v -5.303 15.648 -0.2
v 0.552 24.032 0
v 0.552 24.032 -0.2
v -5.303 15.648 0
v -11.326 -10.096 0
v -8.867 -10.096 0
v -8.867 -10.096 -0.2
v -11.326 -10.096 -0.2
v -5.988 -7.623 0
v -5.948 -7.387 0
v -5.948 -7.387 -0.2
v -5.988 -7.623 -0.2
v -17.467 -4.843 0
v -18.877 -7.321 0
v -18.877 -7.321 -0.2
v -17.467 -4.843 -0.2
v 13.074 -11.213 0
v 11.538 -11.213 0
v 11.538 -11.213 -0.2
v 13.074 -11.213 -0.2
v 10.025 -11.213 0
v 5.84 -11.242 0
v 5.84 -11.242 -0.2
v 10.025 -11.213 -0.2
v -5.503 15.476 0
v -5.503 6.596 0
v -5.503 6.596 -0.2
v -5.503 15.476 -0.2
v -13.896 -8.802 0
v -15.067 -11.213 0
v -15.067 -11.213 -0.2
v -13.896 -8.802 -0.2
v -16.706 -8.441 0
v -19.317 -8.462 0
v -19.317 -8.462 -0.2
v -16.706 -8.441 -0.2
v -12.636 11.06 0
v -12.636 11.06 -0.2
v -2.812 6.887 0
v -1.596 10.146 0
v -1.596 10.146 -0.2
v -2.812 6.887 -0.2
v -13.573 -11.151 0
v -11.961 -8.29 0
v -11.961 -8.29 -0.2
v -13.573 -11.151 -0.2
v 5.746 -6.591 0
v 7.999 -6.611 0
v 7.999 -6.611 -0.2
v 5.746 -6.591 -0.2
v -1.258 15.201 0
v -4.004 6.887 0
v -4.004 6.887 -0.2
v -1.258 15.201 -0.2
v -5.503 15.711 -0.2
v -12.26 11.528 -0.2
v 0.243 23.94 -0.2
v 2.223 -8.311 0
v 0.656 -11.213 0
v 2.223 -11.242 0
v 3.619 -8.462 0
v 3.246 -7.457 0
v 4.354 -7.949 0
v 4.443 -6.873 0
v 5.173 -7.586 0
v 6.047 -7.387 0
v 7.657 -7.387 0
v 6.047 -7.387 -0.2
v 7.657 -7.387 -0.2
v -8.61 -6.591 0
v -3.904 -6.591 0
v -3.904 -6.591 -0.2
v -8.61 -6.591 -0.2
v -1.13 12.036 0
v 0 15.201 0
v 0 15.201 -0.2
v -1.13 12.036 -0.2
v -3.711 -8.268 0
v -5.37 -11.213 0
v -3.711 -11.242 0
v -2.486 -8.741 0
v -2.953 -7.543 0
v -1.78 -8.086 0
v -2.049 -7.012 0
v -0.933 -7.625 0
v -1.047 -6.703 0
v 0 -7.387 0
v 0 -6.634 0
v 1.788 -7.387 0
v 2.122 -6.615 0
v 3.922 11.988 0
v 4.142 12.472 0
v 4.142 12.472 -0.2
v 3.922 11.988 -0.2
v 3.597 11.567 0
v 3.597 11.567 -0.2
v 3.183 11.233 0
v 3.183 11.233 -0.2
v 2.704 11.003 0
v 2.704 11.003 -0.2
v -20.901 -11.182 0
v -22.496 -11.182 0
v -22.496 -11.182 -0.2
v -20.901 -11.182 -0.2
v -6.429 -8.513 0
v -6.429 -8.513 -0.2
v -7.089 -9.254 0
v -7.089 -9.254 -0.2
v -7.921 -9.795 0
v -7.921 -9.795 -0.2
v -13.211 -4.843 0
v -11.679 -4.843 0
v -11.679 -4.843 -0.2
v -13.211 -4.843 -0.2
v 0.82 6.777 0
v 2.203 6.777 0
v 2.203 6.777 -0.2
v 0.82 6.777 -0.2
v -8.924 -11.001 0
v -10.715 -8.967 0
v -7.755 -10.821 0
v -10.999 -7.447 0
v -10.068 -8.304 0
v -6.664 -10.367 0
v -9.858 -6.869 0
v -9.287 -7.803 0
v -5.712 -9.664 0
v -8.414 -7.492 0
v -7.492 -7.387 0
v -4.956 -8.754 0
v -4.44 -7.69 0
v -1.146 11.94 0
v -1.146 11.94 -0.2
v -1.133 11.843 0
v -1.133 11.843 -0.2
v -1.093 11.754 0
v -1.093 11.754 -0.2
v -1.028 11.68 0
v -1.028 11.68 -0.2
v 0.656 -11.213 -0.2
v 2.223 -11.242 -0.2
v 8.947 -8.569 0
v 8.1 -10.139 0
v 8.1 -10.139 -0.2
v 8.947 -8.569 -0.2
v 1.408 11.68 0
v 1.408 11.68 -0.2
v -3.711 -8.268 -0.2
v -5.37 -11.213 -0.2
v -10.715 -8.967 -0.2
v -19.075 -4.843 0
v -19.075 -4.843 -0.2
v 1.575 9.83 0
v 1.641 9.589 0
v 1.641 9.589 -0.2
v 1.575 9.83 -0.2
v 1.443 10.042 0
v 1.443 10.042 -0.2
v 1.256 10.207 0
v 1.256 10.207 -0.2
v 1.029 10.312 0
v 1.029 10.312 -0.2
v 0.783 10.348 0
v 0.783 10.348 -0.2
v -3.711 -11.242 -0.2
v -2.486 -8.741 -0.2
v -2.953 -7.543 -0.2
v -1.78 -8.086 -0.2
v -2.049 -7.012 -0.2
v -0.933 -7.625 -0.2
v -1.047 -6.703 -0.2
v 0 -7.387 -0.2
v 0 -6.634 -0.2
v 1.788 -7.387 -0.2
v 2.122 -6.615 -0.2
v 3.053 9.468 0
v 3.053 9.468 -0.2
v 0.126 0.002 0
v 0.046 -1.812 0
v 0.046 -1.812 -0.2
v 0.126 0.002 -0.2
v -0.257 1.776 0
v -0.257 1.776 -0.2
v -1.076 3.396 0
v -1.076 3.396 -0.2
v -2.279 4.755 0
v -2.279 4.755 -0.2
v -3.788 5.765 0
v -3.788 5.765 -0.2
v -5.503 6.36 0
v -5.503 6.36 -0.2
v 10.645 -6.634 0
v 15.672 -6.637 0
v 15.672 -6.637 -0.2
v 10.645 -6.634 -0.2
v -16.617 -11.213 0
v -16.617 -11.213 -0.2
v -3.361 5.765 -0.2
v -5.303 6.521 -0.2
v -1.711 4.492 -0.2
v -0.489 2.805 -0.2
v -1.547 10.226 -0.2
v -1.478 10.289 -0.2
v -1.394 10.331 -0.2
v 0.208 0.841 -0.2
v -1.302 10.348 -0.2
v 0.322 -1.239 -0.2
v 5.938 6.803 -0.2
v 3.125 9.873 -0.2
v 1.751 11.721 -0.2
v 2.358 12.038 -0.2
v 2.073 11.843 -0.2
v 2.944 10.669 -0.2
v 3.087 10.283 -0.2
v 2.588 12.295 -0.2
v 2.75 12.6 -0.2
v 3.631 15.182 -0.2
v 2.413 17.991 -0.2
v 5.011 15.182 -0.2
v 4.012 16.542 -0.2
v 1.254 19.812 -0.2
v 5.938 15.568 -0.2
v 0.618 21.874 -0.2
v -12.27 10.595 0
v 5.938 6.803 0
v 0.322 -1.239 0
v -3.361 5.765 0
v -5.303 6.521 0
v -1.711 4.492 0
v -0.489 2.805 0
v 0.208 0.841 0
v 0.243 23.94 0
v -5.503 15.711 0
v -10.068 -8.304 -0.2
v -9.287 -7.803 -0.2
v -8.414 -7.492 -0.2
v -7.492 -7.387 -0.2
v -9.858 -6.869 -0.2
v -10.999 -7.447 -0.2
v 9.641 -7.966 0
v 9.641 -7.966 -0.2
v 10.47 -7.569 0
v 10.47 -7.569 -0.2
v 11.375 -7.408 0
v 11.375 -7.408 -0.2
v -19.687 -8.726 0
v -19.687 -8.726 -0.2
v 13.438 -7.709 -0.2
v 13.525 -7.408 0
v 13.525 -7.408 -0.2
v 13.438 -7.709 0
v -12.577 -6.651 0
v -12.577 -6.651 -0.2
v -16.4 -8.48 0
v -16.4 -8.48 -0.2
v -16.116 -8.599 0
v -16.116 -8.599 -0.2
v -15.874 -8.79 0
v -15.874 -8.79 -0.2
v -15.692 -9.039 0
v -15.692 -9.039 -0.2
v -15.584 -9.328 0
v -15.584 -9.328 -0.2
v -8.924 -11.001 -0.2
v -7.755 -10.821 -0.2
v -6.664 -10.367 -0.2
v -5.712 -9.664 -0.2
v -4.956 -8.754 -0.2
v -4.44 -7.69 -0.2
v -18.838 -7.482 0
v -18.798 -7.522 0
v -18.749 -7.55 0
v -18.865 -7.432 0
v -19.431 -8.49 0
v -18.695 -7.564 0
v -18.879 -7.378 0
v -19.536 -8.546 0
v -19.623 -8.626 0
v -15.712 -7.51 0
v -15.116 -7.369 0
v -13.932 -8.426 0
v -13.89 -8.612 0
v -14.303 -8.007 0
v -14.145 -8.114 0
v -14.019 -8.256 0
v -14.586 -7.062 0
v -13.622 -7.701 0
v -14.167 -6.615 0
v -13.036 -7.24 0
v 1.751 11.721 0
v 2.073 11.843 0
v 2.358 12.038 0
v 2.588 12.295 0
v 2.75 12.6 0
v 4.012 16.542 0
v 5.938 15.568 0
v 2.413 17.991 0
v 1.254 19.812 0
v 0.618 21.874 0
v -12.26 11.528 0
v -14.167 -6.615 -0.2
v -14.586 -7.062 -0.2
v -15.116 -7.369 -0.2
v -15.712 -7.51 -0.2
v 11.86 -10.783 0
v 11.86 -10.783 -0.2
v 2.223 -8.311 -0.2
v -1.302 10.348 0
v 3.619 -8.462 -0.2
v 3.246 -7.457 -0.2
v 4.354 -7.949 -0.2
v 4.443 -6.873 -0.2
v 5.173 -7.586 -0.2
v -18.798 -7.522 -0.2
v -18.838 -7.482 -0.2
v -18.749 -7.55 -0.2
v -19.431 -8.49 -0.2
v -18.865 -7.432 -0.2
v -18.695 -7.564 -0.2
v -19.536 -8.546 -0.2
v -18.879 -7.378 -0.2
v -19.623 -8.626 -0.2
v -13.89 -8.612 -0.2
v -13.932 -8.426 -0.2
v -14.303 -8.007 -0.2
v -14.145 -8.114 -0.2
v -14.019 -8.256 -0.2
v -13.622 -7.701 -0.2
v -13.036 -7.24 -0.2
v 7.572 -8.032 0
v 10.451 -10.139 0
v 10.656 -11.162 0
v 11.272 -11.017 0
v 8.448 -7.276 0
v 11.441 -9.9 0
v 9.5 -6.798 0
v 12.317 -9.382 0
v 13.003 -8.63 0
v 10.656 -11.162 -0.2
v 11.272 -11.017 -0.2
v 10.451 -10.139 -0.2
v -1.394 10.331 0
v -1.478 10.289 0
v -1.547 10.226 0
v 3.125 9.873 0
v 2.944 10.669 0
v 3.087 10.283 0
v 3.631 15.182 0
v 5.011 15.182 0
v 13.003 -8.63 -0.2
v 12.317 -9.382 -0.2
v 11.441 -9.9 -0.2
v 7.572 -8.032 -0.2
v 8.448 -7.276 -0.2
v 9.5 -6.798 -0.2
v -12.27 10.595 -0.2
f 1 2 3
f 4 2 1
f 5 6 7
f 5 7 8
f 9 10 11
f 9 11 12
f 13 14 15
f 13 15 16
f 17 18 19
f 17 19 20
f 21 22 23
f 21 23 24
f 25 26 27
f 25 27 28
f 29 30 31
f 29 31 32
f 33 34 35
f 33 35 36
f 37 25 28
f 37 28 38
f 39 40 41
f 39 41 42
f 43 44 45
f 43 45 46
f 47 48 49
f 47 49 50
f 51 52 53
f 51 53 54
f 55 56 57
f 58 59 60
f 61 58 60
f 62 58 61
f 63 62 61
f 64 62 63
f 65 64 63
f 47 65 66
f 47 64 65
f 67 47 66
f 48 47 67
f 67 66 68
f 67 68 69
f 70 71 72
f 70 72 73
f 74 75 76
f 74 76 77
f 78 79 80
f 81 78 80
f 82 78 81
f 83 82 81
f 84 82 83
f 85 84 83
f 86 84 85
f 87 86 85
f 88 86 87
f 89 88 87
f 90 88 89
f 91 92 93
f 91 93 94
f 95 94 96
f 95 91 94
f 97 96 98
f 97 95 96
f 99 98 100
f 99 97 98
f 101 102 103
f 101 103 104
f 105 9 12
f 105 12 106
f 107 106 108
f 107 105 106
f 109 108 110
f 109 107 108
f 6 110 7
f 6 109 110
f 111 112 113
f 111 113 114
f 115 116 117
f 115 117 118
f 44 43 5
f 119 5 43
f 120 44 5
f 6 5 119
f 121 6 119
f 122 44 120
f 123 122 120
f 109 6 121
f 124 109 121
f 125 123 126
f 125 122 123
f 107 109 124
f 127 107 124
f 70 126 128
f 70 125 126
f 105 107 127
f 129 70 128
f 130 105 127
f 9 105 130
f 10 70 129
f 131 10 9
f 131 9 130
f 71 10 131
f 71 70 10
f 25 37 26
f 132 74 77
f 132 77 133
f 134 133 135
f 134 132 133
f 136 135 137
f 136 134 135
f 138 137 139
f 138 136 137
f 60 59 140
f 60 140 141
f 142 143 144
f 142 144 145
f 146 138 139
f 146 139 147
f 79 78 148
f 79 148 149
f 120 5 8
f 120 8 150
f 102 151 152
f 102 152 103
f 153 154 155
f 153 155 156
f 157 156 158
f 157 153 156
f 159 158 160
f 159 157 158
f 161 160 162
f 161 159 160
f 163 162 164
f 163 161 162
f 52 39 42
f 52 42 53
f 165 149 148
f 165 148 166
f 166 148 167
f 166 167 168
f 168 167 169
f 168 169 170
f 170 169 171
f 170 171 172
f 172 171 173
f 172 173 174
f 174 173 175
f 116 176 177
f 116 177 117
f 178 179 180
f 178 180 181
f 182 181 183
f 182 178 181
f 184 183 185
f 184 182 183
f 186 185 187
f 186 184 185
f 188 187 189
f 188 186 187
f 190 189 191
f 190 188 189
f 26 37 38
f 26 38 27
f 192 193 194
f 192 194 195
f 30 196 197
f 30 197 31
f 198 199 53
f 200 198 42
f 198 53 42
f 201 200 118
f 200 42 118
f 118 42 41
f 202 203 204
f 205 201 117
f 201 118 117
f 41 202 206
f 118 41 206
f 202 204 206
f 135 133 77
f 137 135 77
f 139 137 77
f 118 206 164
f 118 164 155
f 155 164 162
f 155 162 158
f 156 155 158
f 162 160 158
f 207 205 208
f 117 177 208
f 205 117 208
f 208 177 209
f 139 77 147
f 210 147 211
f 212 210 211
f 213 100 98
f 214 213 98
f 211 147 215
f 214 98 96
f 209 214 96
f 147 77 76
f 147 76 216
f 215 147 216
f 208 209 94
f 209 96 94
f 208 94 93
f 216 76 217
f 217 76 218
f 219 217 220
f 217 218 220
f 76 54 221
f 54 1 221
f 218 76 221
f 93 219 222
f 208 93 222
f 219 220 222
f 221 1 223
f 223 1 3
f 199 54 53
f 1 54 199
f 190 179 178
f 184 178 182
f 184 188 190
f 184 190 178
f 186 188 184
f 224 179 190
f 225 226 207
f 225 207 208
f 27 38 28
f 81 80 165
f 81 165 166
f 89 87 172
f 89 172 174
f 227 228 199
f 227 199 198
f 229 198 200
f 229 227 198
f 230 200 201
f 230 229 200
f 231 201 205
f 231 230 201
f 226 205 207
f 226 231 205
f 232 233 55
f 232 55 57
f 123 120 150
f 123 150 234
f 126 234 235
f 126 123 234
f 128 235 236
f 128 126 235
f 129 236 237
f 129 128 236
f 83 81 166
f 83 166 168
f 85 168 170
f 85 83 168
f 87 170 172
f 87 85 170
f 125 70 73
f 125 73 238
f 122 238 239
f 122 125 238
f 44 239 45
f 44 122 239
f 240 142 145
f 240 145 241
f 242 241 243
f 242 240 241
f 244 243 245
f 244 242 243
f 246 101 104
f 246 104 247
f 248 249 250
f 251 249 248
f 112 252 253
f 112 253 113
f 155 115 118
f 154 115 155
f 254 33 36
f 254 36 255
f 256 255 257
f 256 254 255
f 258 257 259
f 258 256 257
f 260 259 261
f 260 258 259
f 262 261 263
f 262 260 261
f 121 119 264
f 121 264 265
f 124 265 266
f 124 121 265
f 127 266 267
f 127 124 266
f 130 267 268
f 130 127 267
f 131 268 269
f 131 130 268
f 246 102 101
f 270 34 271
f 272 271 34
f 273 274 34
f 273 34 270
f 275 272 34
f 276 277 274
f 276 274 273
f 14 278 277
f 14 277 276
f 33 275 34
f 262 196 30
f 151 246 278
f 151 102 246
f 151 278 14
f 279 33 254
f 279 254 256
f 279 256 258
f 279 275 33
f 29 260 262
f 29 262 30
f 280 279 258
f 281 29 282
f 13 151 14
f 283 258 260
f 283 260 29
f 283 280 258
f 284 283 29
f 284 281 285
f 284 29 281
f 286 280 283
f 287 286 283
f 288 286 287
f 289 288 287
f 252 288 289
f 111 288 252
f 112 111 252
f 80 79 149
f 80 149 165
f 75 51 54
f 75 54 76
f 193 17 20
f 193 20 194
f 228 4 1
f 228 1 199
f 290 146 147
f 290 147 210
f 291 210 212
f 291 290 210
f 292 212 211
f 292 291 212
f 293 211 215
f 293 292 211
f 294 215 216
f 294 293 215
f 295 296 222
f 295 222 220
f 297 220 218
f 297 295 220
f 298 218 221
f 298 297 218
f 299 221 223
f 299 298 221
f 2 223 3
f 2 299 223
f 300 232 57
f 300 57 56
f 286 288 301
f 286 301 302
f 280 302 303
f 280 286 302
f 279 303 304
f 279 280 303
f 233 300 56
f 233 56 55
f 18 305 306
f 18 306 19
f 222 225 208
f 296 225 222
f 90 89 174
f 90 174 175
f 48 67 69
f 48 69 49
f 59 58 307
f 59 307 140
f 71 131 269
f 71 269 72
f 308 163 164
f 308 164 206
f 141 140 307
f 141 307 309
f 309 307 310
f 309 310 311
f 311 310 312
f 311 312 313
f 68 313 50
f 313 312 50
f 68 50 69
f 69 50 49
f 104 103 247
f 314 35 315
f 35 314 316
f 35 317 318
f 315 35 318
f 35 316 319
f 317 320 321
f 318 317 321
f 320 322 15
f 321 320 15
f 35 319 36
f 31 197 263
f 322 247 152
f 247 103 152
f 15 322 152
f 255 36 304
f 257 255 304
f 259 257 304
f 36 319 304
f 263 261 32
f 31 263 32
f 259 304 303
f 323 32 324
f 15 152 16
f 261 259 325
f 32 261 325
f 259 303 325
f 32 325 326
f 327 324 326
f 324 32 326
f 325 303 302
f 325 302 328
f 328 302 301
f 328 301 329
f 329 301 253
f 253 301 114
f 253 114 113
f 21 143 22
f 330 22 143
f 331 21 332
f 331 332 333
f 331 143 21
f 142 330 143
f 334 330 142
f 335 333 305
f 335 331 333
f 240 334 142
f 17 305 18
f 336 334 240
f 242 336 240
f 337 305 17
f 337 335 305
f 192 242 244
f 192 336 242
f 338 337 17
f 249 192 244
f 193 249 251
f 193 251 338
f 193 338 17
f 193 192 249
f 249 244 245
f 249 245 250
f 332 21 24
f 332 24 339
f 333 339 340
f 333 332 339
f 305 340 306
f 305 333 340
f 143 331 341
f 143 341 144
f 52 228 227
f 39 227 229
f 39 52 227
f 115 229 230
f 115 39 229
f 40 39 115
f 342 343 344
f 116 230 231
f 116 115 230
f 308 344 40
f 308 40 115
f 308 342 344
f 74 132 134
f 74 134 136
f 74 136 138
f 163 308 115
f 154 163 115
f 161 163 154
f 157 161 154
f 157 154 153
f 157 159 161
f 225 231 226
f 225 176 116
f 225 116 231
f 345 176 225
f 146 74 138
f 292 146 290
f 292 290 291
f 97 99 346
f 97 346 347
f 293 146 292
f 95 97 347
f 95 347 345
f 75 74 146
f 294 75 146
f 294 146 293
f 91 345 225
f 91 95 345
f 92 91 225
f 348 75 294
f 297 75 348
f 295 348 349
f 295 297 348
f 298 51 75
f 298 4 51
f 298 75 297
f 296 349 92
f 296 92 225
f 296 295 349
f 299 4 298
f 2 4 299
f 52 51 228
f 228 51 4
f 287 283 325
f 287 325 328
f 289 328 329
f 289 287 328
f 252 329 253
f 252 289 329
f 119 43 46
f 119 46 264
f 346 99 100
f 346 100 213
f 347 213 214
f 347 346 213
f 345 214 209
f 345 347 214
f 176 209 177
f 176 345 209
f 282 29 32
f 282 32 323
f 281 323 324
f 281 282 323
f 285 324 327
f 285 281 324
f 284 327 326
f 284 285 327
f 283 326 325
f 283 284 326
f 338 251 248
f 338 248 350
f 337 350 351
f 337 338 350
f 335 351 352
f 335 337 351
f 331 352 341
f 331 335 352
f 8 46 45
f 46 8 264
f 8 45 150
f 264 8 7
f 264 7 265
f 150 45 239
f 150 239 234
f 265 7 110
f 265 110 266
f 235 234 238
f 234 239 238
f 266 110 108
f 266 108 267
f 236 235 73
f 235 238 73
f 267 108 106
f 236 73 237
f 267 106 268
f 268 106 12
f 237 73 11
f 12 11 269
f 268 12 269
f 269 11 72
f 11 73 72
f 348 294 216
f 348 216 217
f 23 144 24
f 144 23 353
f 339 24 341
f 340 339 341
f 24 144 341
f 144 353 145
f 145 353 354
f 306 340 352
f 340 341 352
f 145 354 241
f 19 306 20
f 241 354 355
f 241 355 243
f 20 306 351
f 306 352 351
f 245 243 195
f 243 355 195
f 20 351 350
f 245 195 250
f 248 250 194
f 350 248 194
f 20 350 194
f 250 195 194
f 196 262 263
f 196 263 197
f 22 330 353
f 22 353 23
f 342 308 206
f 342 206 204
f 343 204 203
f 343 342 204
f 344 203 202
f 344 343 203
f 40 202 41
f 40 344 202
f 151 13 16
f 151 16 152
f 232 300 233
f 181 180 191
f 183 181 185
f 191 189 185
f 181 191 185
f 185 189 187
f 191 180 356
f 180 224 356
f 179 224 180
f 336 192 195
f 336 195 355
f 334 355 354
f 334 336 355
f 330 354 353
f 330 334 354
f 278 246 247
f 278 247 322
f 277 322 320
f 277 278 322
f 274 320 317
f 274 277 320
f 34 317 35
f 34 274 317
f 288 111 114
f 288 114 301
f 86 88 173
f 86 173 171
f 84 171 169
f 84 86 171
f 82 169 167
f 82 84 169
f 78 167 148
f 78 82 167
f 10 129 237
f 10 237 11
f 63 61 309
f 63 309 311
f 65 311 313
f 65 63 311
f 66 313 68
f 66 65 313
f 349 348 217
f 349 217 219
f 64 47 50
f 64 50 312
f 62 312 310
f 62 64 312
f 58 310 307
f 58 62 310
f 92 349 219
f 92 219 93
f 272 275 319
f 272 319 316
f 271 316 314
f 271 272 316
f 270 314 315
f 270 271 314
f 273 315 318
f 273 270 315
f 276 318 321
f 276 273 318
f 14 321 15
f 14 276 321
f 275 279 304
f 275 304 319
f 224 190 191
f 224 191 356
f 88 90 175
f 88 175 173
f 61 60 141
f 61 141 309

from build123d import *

# Parameters (mm, degrees)
F1_DEPTH = 0.2


with BuildPart() as f1:
    # F0 (on Top) → F1 (new body)
    with BuildSketch(Plane.XY):
        with BuildLine():
            Line((0.3221887287, -1.2390491494), (5.9381237452, 6.8029700547))
            Line((5.9381237452, 6.8029700547), (5.9381237452, 15.5676616906))
            ThreePointArc((5.9381237452, 15.5676616906), (1.7723507567, 18.8624852196), (0.551509194, 24.0315347027))
            Line((0.551509194, 24.0315347027), (-5.3026779883, 15.6483383863))
            Line((-5.3026779883, 15.6483383863), (-5.3026779883, 6.5205997522))
            ThreePointArc((-5.3026779883, 6.5205997522), (-1.0395342394, 3.6923760496), (0.3221887287, -1.2390491494))
        make_face()
        with BuildLine():
            Line((-4.0039531887, 6.8868417293), (-1.2578062015, 15.2005720884))
            Line((-1.2578062015, 15.2005720884), (0, 15.2005720884))
            Line((0, 15.2005720884), (-1.1304413683, 12.0364315361))
            ThreePointArc((-1.1304413683, 12.0364315361), (-1.1332673696, 11.8427166471), (-1.0282194708, 11.6799334064))
            Line((-1.0282194708, 11.6799334064), (1.4081238769, 11.6799334064))
            ThreePointArc((1.4081238769, 11.6799334064), (2.2214482851, 11.9320780556), (2.7495124377, 12.6000763848))
            Line((2.7495124377, 12.6000763848), (3.6309957504, 15.181590803))
            Line((3.6309957504, 15.181590803), (5.0107096322, 15.181590803))
            Line((5.0107096322, 15.181590803), (4.1420012712, 12.4715473503))
            ThreePointArc((4.1420012712, 12.4715473503), (3.5967677723, 11.5672258478), (2.7040650602, 11.0031701624))
            ThreePointArc((2.7040650602, 11.0031701624), (3.0871173523, 10.2828780548), (3.0534872785, 9.4677591696))
            Line((3.0534872785, 9.4677591696), (2.2027201485, 6.7769880407))
            Line((2.2027201485, 6.7769880407), (0.820223242, 6.7769880407))
            Line((0.820223242, 6.7769880407), (1.6406058567, 9.589375928))
            ThreePointArc((1.6406058567, 9.589375928), (1.3551604564, 10.1310381804), (0.782554911, 10.3478329256))
            Line((0.782554911, 10.3478329256), (-1.3016803423, 10.3478329256))
            ThreePointArc((-1.3016803423, 10.3478329256), (-1.4779448579, 10.2890176936), (-1.5963046791, 10.1457718779))
            Line((-1.5963046791, 10.1457718779), (-2.8115476016, 6.8868417293))
            Line((-2.8115476016, 6.8868417293), (-4.0039531887, 6.8868417293))
        make_face(mode=Mode.SUBTRACT)
    extrude(amount=-F1_DEPTH)


with BuildPart() as f1b:
    # F0 (on Top) → F1, piece 2 (new body)
    with BuildSketch(Plane.XY):
        with BuildLine():
            ThreePointArc((0.0455915557, -1.8117811989), (-1.0759408053, 3.3961031617), (-5.5026779883, 6.3598663546))
            Line((-5.5026779883, 6.3598663546), (-12.2704175663, 10.5954582346))
            Line((-12.2704175663, 10.5954582346), (0.0455915557, -1.8117811989))
        make_face()
    extrude(amount=-F1_DEPTH)


with BuildPart() as f1c:
    # F0 (on Top) → F1, piece 3 (new body)
    with BuildSketch(Plane.XY):
        Polygon((-5.5026779883, 6.5958060592), (-5.5026779883, 15.4760383667), (-12.635980278, 11.0601854738), align=None)
    extrude(amount=-F1_DEPTH)


with BuildPart() as f1d:
    # F0 (on Top) → F1, piece 4 (new body)
    with BuildSketch(Plane.XY):
        Polygon((-12.2601570899, 11.528058606), (-5.5026779883, 15.7112590969), (0.2434776577, 23.9397542483), align=None)
    extrude(amount=-F1_DEPTH)


with BuildPart() as f1e:
    # F0 (on Top) → F1, piece 5 (new body)
    with BuildSketch(Plane.XY):
        with BuildLine():
            Line((15.6719795434, -6.6372910397), (10.644714348, -6.6343117505))
            ThreePointArc((10.644714348, -6.6343117505), (8.956874135, -6.9996048306), (7.5723426417, -8.0317463726))
            Line((7.5723426417, -8.0317463726), (5.8395114478, -11.2419195165))
            Line((5.8395114478, -11.2419195165), (10.0254435092, -11.213440448))
            ThreePointArc((10.0254435092, -11.213440448), (10.9668398403, -11.1011779704), (11.8598518893, -10.7828080654))
            Line((11.8598518893, -10.7828080654), (11.5375751629, -11.213440448))
            Line((11.5375751629, -11.213440448), (13.0737610161, -11.213440448))
            Line((13.0737610161, -11.213440448), (15.6719795434, -6.6372910397))
        make_face()
        with BuildLine():
            ThreePointArc((8.9473901317, -8.5692228749), (10.0420664485, -7.7394049699), (11.3752083853, -7.4082757346))
            Line((11.3752083853, -7.4082757346), (13.5249486193, -7.4082757346))
            Line((13.5249486193, -7.4082757346), (13.4377796203, -7.7092619613))
            ThreePointArc((13.4377796203, -7.7092619613), (12.3172915564, -9.3821473425), (10.4513484985, -10.1386494935))
            Line((10.4513484985, -10.1386494935), (8.0999564379, -10.1386494935))
            Line((8.0999564379, -10.1386494935), (8.9473901317, -8.5692228749))
        make_face(mode=Mode.SUBTRACT)
    extrude(amount=-F1_DEPTH)


with BuildPart() as f1f:
    # F0 (on Top) → F1, piece 6 (new body)
    with BuildSketch(Plane.XY):
        with BuildLine():
            Line((7.9989461764, -6.6110268672), (5.7461061515, -6.5913153812))
            ThreePointArc((5.7461061515, -6.5913153812), (3.8269548312, -7.1288721816), (2.2225470748, -8.3112362772))
            Line((2.2225470748, -8.3112362772), (0.6559555881, -11.213440448))
            Line((0.6559555881, -11.213440448), (2.2225470748, -11.2419195165))
            Line((2.2225470748, -11.2419195165), (3.6190801766, -8.4617296234))
            ThreePointArc((3.6190801766, -8.4617296234), (4.7548095867, -7.7476826092), (6.0468981974, -7.386778947))
            Line((6.0468981974, -7.386778947), (7.6567602687, -7.3867780156))
            Line((7.6567602687, -7.3867780156), (7.9989461764, -6.6110268672))
        make_face()
    extrude(amount=-F1_DEPTH)


with BuildPart() as f1g:
    # F0 (on Top) → F1, piece 7 (new body)
    with BuildSketch(Plane.XY):
        with BuildLine():
            ThreePointArc((-2.486287849, -8.7412158027), (-1.3708885374, -7.8295011783), (0, -7.3867780156))
            Line((0, -7.3867780156), (1.7875585472, -7.3867780156))
            Line((1.7875585472, -7.3867780156), (2.1217935719, -6.6148531623))
            Line((2.1217935719, -6.6148531623), (0, -6.6343126819))
            ThreePointArc((0, -6.6343126819), (-2.0490469004, -7.011625802), (-3.7109393161, -8.268237114))
            Line((-3.7109393161, -8.268237114), (-5.3702842035, -11.213440448))
            Line((-5.3702842035, -11.213440448), (-3.7109393161, -11.2419195165))
            Line((-3.7109393161, -11.2419195165), (-2.486287849, -8.7412158027))
        make_face()
    extrude(amount=-F1_DEPTH)


with BuildPart() as f1h:
    # F0 (on Top) → F1, piece 8 (new body)
    with BuildSketch(Plane.XY):
        with BuildLine():
            Line((-3.9036741946, -6.5913149156), (-8.6095463485, -6.5913149156))
            ThreePointArc((-8.6095463485, -6.5913149156), (-10.4468670481, -7.12185676), (-11.9612244889, -8.2897366956))
            Line((-11.9612244889, -8.2897366956), (-13.5733263679, -11.1510875002))
            Line((-13.5733263679, -11.1510875002), (-8.9242989197, -11.0012982041))
            ThreePointArc((-8.9242989197, -11.0012982041), (-6.1667191094, -10.0440713662), (-4.4402293861, -7.6904012822))
            Line((-4.4402293861, -7.6904012822), (-3.9036741946, -6.5913149156))
        make_face()
        with BuildLine():
            ThreePointArc((-5.9883617796, -7.6232668944), (-7.0888461772, -9.2542353693), (-8.8673681021, -10.0956531242))
            Line((-8.8673681021, -10.0956531242), (-11.3260233775, -10.0956531242))
            Line((-11.3260233775, -10.0956531242), (-10.7150869444, -8.9674610645))
            ThreePointArc((-10.7150869444, -8.9674610645), (-9.2870890069, -7.8032245883), (-7.4923196808, -7.3867780156))
            Line((-7.4923196808, -7.3867780156), (-5.9476941824, -7.3867780156))
            Line((-5.9476941824, -7.3867780156), (-5.9883617796, -7.6232668944))
        make_face(mode=Mode.SUBTRACT)
    extrude(amount=-F1_DEPTH)


with BuildPart() as f1i:
    # F0 (on Top) → F1, piece 9 (new body)
    with BuildSketch(Plane.XY):
        with BuildLine():
            ThreePointArc((-14.1671802849, -6.6148531623), (-14.8395201872, -7.2349347814), (-15.7118886709, -7.5097354129))
            Line((-15.7118886709, -7.5097354129), (-18.6945162714, -7.5642843731))
            ThreePointArc((-18.6945162714, -7.5642843731), (-18.8379589434, -7.4818591939), (-18.8768226653, -7.3210508563))
            Line((-18.8768226653, -7.3210508563), (-17.4670927227, -4.8431316391))
            Line((-17.4670927227, -4.8431316391), (-19.0745219588, -4.8431316391))
            Line((-19.0745219588, -4.8431316391), (-22.49625884, -11.1821033061))
            Line((-22.49625884, -11.1821033061), (-20.9010709077, -11.1821033061))
            Line((-20.9010709077, -11.1821033061), (-19.6871310472, -8.7255975232))
            ThreePointArc((-19.6871310472, -8.7255975232), (-19.5357739882, -8.5461370978), (-19.3165130913, -8.4622344002))
            Line((-19.3165130913, -8.4622344002), (-16.7060699314, -8.4407348186))
            ThreePointArc((-16.7060699314, -8.4407348186), (-15.9887854149, -8.68665027), (-15.5837750062, -9.3276947737))
            Line((-15.5837750062, -9.3276947737), (-16.6168492287, -11.213440448))
            Line((-16.6168492287, -11.213440448), (-15.066714026, -11.213440448))
            Line((-15.066714026, -11.213440448), (-13.8961784542, -8.8023440912))
            ThreePointArc((-13.8961784542, -8.8023440912), (-13.9701576636, -8.3385560844), (-14.3026812002, -8.0068930984))
            ThreePointArc((-14.3026812002, -8.0068930984), (-13.3148360087, -7.4882155641), (-12.5773055479, -6.6510098986))
            Line((-12.5773055479, -6.6510098986), (-11.6788372397, -4.8431316391))
            Line((-11.6788372397, -4.8431316391), (-13.2108161934, -4.8431316391))
            Line((-13.2108161934, -4.8431316391), (-14.1671802849, -6.6148531623))
        make_face()
    extrude(amount=-F1_DEPTH)


with BuildPart() as f1b_1:
    # F2: moved
    add(f1b.part)


with BuildPart() as f1i_1:
    # F2: moved
    add(f1i.part)


with BuildPart() as f1h_1:
    # F2: moved
    add(f1h.part)


with BuildPart() as f1g_1:
    # F2: moved
    add(f1g.part)


with BuildPart() as f1c_1:
    # F2: moved
    add(f1c.part)


with BuildPart() as f1d_1:
    # F2: moved
    add(f1d.part)


with BuildPart() as f1_1:
    # F2: moved
    add(f1.part)


with BuildPart() as f1f_1:
    # F2: moved
    add(f1f.part)


with BuildPart() as f1e_1:
    # F2: moved
    add(f1e.part)


solid = Compound([f1b_1.part, f1i_1.part, f1h_1.part, f1g_1.part, f1c_1.part, f1d_1.part, f1_1.part, f1f_1.part, f1e_1.part])
